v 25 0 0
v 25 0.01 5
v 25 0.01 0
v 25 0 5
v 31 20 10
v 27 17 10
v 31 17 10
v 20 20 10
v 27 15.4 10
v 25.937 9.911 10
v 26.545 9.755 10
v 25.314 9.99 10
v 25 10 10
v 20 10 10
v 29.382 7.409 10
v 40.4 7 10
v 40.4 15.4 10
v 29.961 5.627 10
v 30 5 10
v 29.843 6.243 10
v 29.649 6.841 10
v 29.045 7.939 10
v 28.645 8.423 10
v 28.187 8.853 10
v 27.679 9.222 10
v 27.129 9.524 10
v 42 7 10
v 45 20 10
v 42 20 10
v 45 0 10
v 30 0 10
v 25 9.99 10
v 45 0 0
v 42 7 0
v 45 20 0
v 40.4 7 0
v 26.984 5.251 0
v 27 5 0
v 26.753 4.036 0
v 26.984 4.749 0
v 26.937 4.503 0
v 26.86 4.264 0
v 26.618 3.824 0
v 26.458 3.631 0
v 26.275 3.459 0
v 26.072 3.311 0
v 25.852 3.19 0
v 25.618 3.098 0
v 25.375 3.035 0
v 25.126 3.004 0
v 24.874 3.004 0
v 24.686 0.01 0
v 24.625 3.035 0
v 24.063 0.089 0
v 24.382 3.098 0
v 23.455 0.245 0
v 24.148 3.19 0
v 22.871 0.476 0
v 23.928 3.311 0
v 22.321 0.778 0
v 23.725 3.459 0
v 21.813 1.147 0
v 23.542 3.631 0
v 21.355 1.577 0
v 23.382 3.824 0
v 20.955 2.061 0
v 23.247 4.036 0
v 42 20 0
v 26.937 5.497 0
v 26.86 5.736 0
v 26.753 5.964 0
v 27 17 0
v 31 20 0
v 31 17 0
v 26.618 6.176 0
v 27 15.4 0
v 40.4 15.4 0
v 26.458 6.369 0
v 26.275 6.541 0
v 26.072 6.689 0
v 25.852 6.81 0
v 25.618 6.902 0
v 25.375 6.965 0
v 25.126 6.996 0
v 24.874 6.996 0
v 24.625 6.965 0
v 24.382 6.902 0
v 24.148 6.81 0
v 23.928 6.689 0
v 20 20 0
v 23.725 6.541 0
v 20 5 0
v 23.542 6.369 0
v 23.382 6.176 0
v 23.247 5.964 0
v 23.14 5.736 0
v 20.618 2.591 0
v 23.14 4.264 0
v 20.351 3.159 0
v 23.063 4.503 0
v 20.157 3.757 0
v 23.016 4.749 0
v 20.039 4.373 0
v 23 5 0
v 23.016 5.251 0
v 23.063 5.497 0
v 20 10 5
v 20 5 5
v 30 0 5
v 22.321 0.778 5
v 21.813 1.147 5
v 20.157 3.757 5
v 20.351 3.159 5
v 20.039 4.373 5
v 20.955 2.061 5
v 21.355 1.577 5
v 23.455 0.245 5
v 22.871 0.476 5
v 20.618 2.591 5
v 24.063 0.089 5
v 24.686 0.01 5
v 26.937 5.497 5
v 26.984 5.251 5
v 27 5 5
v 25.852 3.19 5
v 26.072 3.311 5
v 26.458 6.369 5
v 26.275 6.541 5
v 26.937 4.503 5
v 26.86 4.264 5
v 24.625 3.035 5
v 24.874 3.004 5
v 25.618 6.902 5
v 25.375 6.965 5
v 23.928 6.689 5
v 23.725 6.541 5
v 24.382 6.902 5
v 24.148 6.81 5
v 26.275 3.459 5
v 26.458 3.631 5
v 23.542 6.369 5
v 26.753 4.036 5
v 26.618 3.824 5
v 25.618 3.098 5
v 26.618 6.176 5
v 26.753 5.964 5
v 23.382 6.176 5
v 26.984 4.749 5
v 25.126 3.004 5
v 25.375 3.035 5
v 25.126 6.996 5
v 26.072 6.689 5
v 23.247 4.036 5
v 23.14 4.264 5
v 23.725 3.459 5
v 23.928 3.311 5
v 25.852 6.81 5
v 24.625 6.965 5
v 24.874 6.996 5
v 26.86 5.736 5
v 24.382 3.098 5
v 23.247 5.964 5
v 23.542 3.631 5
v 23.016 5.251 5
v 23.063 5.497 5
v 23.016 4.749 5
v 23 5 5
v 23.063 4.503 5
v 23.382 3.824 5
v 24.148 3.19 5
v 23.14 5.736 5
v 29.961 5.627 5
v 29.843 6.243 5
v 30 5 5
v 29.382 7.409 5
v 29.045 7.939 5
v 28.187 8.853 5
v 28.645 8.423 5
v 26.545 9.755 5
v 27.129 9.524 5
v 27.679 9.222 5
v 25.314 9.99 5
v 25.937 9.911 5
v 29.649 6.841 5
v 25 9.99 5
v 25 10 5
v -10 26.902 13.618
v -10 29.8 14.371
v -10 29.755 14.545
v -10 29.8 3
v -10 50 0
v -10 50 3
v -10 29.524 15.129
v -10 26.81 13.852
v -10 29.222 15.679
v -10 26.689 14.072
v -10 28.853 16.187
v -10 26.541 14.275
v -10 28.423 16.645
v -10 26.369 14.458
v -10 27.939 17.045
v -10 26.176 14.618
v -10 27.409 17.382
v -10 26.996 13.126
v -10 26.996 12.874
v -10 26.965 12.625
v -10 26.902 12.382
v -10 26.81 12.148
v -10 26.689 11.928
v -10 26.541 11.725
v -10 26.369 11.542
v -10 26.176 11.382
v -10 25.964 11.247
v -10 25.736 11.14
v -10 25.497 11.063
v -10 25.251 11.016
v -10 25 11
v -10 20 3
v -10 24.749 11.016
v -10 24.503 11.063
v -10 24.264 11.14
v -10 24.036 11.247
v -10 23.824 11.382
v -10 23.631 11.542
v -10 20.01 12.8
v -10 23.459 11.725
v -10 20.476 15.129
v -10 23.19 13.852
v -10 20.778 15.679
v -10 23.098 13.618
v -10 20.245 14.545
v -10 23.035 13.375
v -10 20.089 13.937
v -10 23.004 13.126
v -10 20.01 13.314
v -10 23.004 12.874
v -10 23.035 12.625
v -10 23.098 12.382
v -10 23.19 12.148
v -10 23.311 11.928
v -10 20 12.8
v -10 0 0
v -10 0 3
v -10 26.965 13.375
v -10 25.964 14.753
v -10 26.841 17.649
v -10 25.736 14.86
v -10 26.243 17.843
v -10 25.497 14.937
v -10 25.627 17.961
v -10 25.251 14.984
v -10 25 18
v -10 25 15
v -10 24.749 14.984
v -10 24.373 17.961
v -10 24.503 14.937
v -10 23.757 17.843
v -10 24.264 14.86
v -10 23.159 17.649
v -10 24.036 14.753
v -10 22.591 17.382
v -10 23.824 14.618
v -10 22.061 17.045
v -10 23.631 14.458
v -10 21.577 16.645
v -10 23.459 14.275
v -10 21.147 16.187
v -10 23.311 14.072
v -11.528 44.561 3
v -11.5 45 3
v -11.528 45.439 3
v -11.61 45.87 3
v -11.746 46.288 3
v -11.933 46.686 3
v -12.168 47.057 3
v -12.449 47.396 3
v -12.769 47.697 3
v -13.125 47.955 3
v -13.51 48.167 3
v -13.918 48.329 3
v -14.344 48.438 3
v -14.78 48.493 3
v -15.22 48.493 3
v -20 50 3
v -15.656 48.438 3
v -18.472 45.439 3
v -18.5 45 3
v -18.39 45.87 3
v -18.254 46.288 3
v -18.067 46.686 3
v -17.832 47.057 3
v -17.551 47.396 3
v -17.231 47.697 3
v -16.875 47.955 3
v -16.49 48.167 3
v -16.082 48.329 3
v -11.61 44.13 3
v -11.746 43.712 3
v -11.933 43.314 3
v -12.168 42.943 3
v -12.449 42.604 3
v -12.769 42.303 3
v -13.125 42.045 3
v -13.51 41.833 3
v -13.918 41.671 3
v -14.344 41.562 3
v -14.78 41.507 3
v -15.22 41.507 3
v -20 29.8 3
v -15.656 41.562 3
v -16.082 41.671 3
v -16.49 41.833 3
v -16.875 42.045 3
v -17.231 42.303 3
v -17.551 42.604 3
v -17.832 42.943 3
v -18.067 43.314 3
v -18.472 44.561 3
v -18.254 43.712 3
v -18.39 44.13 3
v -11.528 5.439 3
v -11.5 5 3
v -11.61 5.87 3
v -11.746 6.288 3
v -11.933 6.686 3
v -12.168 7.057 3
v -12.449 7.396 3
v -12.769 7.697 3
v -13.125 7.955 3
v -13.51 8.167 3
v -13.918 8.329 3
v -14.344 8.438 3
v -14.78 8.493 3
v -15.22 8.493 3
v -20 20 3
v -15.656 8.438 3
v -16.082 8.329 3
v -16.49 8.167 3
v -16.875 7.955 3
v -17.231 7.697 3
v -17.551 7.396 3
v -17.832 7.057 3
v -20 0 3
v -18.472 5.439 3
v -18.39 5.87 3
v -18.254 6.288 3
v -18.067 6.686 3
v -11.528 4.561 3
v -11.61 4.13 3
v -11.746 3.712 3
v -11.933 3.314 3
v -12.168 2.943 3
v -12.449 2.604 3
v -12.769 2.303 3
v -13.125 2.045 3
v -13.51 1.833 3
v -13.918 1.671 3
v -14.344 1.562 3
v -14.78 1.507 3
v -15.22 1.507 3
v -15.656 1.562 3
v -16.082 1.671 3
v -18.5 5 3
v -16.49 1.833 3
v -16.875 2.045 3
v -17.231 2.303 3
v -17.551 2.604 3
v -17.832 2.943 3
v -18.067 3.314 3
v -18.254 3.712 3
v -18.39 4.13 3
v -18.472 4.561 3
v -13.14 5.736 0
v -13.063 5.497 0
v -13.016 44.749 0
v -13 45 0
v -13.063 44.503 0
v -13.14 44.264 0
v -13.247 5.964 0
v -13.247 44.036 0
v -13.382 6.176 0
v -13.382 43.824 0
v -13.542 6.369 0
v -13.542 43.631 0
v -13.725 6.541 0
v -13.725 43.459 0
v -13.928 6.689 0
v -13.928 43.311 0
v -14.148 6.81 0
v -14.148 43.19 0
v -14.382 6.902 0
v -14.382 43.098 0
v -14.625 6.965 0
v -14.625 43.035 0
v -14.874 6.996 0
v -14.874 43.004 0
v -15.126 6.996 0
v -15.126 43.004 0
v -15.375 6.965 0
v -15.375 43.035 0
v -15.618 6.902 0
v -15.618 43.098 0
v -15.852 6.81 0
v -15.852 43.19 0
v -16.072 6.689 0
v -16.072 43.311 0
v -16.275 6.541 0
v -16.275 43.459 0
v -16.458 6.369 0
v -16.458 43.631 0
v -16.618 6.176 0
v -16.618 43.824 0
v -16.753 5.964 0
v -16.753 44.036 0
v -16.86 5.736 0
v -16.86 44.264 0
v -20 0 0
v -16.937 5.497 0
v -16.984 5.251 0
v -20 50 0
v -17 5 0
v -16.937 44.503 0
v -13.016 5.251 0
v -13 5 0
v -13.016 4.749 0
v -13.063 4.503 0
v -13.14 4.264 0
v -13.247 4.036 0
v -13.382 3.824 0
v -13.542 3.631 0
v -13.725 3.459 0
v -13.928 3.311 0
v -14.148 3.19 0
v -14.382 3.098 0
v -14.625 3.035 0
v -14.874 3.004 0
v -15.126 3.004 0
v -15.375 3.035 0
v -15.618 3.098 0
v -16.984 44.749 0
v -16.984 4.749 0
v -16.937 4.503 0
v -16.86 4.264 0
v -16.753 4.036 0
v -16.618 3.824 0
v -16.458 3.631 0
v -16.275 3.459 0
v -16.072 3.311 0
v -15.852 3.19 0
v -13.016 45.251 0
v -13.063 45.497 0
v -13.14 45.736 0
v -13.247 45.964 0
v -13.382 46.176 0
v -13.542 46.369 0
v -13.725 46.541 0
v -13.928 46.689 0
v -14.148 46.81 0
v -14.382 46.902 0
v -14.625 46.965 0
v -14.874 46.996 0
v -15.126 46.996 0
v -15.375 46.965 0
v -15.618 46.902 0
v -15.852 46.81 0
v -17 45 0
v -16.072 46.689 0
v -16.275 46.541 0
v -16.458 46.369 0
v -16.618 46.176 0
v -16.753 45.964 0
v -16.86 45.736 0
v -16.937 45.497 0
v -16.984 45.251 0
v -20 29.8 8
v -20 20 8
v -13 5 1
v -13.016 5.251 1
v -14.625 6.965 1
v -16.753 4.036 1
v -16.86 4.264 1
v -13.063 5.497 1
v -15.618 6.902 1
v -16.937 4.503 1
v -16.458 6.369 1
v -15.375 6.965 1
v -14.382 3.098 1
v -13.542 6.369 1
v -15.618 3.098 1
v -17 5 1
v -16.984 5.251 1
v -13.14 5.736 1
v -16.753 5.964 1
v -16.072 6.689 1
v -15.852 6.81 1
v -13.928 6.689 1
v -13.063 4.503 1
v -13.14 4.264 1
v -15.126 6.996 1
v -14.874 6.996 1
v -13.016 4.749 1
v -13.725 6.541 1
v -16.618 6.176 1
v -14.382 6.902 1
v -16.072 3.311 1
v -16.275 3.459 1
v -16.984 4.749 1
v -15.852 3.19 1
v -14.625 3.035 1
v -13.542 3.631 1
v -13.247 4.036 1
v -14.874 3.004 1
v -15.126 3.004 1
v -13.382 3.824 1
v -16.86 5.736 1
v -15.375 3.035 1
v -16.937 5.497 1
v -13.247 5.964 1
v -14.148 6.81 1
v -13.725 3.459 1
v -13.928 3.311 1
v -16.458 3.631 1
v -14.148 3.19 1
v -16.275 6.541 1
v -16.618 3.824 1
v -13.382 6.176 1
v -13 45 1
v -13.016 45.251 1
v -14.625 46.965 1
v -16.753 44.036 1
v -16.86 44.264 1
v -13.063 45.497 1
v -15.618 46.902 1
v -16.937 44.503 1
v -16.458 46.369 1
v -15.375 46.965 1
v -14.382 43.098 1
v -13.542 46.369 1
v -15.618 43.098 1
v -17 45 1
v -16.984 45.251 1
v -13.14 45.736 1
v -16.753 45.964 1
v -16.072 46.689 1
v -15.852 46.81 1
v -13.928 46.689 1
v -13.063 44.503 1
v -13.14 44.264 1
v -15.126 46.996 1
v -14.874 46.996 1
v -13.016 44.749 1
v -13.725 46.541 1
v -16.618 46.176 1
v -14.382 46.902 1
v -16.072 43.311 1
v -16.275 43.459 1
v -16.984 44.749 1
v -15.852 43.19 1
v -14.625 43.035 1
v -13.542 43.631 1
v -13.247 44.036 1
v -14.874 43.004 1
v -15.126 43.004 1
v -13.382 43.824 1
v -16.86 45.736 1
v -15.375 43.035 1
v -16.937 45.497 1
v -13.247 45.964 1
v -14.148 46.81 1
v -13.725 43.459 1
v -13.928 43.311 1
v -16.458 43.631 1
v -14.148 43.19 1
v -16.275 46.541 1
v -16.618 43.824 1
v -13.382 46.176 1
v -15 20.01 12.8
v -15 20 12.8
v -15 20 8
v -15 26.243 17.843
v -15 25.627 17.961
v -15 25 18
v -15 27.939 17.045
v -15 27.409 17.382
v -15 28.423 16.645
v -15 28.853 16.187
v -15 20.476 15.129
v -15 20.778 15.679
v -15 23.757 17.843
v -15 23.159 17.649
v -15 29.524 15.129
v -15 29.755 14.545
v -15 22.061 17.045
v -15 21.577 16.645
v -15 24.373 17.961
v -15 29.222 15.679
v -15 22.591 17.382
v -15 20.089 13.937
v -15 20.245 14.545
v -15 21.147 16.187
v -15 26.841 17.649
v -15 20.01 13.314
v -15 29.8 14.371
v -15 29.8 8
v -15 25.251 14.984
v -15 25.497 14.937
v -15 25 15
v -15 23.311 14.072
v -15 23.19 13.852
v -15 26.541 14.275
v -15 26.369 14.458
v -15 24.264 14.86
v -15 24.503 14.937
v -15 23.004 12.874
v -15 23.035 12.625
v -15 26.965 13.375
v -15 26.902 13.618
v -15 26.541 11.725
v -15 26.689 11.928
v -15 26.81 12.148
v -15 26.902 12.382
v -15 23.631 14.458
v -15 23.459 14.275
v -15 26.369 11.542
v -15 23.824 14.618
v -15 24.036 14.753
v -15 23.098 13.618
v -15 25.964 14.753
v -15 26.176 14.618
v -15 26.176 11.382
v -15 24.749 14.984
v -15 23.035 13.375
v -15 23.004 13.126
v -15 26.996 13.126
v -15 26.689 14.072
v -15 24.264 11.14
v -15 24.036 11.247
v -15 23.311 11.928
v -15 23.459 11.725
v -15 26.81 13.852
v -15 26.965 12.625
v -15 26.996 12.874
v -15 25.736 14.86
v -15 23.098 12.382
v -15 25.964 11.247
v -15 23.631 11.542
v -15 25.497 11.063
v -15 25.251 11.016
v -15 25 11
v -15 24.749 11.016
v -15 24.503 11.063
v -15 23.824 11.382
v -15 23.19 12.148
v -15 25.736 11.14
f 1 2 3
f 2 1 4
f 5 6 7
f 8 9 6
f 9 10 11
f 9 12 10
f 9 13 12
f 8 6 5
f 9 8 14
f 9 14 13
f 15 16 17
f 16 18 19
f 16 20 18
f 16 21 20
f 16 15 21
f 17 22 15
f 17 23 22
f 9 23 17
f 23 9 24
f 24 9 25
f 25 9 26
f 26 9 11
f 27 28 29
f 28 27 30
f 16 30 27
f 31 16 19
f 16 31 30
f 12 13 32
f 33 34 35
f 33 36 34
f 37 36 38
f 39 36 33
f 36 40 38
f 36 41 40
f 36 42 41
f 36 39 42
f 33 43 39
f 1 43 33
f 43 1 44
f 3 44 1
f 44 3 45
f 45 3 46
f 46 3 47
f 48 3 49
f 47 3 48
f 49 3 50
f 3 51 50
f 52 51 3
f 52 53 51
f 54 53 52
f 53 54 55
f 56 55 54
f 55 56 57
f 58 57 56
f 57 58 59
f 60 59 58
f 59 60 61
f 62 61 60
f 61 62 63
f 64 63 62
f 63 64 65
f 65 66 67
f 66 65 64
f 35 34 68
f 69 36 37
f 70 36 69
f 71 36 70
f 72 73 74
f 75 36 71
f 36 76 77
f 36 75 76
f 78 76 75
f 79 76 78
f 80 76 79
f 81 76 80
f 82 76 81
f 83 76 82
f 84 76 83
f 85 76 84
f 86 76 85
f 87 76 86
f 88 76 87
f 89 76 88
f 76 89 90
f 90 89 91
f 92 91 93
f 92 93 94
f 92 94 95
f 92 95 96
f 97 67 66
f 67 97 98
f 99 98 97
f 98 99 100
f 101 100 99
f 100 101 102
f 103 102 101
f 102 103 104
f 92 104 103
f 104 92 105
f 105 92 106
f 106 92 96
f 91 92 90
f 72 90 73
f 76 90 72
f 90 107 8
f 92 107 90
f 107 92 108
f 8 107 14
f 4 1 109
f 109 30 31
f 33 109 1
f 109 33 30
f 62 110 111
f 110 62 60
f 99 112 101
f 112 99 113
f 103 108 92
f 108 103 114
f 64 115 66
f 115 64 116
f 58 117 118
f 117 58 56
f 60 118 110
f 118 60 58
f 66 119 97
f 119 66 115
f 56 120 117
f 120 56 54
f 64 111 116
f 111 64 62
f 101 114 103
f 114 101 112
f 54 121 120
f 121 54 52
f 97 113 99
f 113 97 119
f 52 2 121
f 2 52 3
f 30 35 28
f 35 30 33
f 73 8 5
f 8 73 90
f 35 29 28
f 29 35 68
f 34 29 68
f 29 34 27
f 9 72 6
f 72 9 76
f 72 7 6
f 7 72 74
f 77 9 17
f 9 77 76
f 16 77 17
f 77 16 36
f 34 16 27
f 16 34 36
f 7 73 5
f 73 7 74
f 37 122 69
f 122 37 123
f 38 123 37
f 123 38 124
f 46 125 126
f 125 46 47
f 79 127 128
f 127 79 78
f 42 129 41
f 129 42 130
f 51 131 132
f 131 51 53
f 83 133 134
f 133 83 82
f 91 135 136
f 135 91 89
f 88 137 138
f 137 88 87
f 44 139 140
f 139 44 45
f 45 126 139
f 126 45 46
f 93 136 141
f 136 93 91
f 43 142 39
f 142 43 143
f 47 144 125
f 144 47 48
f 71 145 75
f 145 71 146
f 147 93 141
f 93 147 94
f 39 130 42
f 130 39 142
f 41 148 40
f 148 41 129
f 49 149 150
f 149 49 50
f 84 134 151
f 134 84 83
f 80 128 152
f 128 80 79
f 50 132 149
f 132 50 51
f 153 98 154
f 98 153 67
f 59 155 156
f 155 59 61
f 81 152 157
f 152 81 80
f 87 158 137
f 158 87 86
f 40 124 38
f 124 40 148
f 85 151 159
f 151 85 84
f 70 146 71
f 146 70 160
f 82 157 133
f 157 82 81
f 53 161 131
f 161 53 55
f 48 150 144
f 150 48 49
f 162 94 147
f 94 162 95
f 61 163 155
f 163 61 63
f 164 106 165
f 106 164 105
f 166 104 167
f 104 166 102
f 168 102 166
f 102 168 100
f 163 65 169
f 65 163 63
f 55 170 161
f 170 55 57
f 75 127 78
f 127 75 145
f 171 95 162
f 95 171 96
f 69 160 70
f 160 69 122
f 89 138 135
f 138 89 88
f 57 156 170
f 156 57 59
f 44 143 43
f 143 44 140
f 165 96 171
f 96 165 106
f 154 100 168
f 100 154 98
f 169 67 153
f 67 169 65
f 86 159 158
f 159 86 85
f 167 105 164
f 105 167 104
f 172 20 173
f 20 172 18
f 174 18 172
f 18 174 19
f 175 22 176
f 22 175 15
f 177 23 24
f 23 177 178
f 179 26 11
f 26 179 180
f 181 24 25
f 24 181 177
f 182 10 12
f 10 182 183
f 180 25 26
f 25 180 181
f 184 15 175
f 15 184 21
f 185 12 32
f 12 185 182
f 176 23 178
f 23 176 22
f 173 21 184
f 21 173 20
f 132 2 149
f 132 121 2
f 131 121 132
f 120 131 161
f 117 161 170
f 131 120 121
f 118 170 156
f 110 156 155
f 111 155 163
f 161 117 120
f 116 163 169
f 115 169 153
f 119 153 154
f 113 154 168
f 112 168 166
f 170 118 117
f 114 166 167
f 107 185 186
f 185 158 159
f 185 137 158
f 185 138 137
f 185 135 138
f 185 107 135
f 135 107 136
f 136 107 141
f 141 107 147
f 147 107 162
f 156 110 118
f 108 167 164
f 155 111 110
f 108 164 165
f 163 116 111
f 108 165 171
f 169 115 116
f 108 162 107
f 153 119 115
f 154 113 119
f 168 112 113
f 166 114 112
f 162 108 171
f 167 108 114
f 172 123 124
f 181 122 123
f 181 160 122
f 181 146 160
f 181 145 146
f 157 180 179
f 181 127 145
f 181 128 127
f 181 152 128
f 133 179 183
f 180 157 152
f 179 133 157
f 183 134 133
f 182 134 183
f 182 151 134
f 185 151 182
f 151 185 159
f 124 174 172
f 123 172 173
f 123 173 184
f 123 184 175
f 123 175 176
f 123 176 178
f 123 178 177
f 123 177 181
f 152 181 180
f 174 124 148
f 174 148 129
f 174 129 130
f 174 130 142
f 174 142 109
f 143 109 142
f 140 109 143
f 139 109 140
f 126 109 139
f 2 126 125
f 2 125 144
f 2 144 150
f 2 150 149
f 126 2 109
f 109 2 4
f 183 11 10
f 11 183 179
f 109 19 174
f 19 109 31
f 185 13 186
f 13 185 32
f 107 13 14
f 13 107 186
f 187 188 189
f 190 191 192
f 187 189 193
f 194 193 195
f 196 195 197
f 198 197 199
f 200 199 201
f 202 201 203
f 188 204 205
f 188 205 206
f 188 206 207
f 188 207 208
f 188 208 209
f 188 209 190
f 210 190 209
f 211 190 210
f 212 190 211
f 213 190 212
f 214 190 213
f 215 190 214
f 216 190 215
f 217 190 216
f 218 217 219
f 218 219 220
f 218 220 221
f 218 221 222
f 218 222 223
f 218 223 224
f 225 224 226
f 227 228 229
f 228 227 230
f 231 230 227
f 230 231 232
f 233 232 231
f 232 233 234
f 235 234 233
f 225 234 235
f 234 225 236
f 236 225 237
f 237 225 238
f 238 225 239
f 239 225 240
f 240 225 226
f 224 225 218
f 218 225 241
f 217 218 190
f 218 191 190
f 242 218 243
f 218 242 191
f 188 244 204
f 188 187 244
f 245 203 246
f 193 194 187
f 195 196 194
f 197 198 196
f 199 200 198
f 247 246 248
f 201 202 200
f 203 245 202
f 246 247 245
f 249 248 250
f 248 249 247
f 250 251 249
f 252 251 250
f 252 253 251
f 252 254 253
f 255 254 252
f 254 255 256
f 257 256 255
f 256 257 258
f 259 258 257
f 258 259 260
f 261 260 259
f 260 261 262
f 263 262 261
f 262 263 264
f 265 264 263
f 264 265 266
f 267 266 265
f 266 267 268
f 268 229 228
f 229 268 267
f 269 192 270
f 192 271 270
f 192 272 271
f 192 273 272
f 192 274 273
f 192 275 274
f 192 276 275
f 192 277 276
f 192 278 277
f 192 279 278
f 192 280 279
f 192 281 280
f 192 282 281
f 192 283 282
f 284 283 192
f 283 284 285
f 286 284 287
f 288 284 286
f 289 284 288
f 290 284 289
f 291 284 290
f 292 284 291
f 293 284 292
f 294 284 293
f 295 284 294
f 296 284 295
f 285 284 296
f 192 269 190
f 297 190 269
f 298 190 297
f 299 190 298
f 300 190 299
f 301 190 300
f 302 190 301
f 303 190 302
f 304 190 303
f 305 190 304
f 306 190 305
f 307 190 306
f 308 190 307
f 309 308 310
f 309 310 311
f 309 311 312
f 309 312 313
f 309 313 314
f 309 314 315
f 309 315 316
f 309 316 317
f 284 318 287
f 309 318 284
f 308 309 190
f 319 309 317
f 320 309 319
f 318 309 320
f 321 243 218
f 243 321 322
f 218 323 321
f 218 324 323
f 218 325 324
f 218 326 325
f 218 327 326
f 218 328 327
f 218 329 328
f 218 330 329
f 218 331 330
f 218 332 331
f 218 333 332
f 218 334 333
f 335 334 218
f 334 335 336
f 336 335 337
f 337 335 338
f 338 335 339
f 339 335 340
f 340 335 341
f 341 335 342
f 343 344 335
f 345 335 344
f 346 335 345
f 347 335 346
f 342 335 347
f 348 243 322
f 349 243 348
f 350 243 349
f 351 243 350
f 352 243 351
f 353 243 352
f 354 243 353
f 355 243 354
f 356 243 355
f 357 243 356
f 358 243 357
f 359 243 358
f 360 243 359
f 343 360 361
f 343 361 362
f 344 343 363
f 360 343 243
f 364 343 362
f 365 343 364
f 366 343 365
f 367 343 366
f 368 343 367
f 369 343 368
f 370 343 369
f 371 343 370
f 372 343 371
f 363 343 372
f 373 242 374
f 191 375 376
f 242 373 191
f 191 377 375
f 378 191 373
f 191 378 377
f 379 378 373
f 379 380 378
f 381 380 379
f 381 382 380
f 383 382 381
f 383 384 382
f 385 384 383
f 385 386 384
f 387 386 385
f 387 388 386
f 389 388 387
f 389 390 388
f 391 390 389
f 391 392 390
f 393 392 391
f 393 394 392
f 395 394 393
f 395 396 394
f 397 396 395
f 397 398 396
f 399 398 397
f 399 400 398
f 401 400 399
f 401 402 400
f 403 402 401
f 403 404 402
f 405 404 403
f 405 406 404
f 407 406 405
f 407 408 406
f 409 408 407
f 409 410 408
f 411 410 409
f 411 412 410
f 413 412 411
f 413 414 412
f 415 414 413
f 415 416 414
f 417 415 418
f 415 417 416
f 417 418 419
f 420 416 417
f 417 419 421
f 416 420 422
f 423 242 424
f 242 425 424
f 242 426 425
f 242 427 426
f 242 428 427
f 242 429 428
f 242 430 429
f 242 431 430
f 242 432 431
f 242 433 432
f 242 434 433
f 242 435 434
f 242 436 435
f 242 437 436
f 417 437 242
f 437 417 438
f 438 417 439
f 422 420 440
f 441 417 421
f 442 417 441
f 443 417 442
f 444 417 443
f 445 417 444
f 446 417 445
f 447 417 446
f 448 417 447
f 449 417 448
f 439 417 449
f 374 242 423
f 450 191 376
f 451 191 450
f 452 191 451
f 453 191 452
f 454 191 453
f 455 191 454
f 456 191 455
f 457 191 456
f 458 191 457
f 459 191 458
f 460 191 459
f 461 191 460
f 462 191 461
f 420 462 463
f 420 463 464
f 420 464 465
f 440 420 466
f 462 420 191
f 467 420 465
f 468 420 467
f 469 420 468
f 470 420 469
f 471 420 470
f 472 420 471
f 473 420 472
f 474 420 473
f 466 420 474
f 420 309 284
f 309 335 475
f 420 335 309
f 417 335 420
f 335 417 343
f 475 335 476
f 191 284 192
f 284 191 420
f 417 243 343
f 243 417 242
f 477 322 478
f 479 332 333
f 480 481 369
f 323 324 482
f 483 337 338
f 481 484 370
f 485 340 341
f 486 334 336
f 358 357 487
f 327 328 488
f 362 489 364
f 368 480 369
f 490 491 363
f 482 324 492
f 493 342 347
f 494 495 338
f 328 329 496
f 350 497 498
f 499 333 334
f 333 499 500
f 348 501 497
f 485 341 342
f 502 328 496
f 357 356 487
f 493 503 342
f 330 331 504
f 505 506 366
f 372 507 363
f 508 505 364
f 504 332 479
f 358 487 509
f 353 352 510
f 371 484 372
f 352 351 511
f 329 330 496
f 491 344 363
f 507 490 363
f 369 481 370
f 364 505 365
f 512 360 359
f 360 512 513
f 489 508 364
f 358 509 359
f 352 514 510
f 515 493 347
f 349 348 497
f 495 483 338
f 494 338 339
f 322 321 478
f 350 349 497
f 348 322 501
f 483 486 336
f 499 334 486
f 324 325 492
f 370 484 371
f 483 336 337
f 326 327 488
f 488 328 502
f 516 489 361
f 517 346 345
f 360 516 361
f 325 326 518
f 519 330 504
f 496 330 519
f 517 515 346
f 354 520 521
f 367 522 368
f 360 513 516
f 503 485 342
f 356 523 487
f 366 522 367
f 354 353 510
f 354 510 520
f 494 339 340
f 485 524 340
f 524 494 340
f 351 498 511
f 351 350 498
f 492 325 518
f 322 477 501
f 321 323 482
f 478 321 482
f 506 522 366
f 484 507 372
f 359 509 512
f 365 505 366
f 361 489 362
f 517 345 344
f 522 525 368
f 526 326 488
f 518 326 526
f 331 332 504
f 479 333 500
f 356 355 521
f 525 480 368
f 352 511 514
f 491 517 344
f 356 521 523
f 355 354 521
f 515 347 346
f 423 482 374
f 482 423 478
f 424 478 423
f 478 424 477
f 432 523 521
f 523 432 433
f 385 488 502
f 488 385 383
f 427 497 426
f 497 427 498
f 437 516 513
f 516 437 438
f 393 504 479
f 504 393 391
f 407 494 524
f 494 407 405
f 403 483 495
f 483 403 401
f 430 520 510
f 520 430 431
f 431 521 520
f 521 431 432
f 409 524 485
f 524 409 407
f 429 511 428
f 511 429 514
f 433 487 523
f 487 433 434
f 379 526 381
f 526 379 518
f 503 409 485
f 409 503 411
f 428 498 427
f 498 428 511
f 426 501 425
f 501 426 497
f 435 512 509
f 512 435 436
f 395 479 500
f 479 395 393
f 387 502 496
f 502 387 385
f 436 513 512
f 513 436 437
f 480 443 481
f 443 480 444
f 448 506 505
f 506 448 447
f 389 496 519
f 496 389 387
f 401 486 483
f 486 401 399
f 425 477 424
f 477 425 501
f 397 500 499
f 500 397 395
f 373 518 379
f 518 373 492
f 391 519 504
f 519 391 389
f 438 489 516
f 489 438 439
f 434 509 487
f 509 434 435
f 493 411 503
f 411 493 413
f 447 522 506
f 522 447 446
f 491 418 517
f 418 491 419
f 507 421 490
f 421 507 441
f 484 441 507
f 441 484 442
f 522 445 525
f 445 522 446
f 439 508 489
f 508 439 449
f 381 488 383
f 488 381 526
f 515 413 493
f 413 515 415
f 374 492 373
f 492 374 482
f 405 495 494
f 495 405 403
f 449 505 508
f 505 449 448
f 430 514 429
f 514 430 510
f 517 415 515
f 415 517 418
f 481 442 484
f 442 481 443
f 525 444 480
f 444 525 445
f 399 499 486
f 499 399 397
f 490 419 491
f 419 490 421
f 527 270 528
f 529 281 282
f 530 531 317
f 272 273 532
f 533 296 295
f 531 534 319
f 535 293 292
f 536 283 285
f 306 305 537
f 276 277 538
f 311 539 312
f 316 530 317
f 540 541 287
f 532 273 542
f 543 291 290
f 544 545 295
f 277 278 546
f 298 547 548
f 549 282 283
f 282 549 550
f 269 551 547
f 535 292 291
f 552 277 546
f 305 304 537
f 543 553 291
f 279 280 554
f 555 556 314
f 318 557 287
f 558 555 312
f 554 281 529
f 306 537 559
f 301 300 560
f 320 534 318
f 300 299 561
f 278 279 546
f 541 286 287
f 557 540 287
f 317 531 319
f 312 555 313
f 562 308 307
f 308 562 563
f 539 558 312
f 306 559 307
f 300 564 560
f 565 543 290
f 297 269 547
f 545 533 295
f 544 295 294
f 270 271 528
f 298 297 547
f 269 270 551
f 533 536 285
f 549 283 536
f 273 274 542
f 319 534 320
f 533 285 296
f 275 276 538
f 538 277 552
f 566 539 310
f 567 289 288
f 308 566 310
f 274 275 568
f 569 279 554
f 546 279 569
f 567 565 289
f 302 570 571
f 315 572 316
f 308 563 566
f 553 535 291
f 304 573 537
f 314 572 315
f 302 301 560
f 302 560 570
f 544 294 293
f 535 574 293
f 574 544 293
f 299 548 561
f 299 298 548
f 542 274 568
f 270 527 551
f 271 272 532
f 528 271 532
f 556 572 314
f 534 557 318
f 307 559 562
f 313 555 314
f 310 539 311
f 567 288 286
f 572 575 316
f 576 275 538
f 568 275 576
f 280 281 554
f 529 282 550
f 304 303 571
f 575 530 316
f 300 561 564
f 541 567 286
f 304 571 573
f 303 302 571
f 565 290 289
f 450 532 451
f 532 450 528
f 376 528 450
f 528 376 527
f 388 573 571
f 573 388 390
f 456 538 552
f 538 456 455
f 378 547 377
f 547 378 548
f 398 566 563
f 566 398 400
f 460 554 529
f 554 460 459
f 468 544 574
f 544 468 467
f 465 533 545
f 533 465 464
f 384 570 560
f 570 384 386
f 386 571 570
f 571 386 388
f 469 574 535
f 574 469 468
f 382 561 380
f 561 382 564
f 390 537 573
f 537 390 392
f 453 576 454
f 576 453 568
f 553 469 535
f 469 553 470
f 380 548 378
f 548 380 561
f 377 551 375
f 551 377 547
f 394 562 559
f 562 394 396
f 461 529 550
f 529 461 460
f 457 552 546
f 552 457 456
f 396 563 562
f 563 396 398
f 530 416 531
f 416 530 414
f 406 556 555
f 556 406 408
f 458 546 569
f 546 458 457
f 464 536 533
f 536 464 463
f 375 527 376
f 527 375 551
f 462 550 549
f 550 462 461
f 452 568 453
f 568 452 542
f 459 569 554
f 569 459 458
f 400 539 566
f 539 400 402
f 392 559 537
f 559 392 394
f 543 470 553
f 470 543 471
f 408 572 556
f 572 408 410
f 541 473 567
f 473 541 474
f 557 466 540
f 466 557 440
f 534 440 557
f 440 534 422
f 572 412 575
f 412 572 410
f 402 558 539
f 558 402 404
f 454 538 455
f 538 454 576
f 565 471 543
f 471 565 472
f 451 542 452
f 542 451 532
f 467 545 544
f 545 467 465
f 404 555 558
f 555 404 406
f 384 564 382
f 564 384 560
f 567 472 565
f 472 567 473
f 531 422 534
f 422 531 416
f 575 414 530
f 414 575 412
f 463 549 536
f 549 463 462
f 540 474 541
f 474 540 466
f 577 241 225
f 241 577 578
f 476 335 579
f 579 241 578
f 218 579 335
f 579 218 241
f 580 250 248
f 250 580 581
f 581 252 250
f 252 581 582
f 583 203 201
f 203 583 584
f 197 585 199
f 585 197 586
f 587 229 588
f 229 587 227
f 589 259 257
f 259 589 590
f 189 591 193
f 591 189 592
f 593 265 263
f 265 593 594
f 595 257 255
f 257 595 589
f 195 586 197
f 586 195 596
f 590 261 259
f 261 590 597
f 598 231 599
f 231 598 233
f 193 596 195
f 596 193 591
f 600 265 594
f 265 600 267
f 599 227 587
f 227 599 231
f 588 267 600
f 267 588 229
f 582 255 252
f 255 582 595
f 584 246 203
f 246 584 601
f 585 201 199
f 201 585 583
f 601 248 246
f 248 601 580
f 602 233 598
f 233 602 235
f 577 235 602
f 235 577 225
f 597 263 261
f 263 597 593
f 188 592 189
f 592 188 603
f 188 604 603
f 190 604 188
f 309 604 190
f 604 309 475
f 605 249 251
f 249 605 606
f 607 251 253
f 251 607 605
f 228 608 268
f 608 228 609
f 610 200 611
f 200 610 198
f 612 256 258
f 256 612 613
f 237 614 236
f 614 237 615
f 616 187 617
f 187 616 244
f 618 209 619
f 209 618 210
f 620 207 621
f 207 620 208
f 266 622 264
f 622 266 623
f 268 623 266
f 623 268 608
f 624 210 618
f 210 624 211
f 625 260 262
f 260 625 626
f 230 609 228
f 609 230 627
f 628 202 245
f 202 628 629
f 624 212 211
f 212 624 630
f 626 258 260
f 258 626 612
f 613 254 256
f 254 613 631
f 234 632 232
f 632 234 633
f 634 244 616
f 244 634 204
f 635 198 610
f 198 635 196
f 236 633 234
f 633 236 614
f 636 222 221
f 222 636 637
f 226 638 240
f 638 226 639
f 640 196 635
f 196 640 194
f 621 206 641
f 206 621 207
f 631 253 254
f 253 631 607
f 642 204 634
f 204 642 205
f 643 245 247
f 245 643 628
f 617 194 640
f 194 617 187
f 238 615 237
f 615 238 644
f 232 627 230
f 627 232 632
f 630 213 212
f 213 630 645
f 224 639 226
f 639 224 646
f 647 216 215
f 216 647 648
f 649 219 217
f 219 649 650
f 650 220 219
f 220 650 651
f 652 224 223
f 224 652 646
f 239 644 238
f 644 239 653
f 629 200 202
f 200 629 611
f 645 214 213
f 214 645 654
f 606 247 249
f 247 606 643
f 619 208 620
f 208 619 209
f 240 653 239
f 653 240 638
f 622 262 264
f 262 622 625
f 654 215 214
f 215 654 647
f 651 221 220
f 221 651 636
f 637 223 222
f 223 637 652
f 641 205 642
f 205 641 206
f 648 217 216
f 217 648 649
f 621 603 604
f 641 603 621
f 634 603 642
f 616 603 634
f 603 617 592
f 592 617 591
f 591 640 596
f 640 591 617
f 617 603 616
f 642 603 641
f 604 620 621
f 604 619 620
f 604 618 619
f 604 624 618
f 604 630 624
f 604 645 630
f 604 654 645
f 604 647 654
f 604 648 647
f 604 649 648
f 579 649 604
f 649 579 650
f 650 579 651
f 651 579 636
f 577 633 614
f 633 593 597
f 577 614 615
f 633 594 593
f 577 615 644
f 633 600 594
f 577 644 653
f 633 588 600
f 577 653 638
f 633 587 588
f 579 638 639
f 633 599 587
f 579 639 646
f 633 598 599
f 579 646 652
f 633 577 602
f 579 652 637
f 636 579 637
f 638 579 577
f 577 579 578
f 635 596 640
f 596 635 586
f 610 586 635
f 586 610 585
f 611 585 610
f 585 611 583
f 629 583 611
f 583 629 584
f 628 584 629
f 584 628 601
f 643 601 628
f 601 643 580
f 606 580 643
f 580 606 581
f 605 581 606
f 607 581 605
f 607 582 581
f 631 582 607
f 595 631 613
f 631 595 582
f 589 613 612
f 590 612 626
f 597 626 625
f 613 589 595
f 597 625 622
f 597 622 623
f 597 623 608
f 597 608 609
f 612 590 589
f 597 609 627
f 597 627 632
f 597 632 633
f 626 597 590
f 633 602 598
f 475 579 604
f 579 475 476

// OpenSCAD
base_width=10;
base_height=50;
base_thickness=3;
base_arm_lenght=15;

hole_diameter=4;
hole_border=3;

holder_width=25;
holder_height=20;
holder_thickness=10;

profile_width=15;
profile_height=10;
profile_thickness=1.6;
profile_border=3;

strip_space_width=11;

screw_hole_diameter=7;
screw_hole_depth=2;

spacing=0.2;
$fn=50;

Assembly();

module Assembly(){
    translate ([20,0,0]) holder();
    translate ([-20,0,0])base();
    };

module holder(){
    difference(){
        cube([holder_width,holder_height,holder_thickness],center = false);
        difference(){
            cube([hole_border+hole_diameter/2,hole_border+hole_diameter/2,holder_thickness], center=false);
            translate([hole_diameter/2+hole_border,hole_diameter/2+hole_border,0])cylinder(r=hole_diameter/2+hole_border,h=holder_thickness,center = false);
        }
        translate([holder_width-profile_width-profile_border,holder_height-profile_thickness-profile_border,0,]) cube([profile_width,profile_thickness,holder_thickness],center = false);
        translate([holder_width-profile_thickness-profile_border,holder_height-profile_height-profile_border,0,]) cube([profile_thickness,profile_height,holder_thickness],center = false);
            translate([holder_width-strip_space_width-profile_border,holder_height-profile_border,0,]) cube([strip_space_width,profile_border,holder_thickness],center = false); 
        translate([hole_border+(hole_diameter/2),hole_border+(hole_diameter/2),0,]) cylinder(r=hole_diameter/2,h=holder_thickness,center = false);
        translate([hole_diameter/2+hole_border,hole_diameter/2+hole_border,holder_thickness/2])cylinder(r=hole_diameter/2+hole_border,h=holder_thickness/2,center = false);        
        translate([hole_diameter/2+hole_border,0,holder_thickness/2])cube ([hole_diameter/2+hole_border,hole_diameter/2+hole_border,holder_thickness/2],center = false); 
        translate([0,hole_diameter/2+hole_border,holder_thickness/2])cube ([hole_diameter/2+hole_border,hole_diameter/2+hole_border,holder_thickness/2],center = false); 
        }
               

    };
module base(){
    union(){
/*Base*/    
        difference(){
        cube([base_width,base_height,base_thickness],center = false);
/*Hole1*/
        translate([hole_diameter/2+hole_border,hole_diameter/2+hole_border,base_thickness-screw_hole_depth])cylinder(r2=screw_hole_diameter/2,r1=hole_diameter/2,h=screw_hole_depth,center = false);
        translate([hole_diameter/2+hole_border,hole_diameter/2+hole_border,0])cylinder(r=hole_diameter/2,h=base_width/2,center = false); 
/*Hole1*/
        translate([hole_diameter/2+hole_border,base_height-(hole_diameter/2+hole_border),base_thickness-screw_hole_depth])cylinder(r2=screw_hole_diameter/2,r1=hole_diameter/2,h=screw_hole_depth,center = false);
        translate([hole_diameter/2+hole_border,base_height-(hole_diameter/2+hole_border),0])cylinder(r=hole_diameter/2,h=base_width/2,center = false); 
        }
/*Arm*/            
        translate([base_width,base_height/2-(base_width/2),base_thickness]) rotate([0,-90,0]){ 
          difference(){
                cube([base_arm_lenght,base_width-spacing,hole_diameter+2*hole_border]);
              translate([base_arm_lenght-(2*hole_border+hole_diameter),0,0]) difference(){
            translate([hole_border+hole_diameter/2-spacing,0,0]) cube([hole_border+(hole_diameter/2)+2*spacing,2*hole_border+hole_diameter,base_width], center=false);
            translate([base_arm_lenght-(2*hole_border+hole_diameter),hole_diameter/2+hole_border,0])cylinder(r=hole_diameter/2+hole_border,h=holder_thickness,center = false);
        }
                translate([base_arm_lenght-(hole_border+(hole_diameter/2)),hole_border+(hole_diameter/2),0,]) cylinder(r=hole_diameter/2,h=holder_thickness,center = false);
              translate([base_arm_lenght-(hole_diameter+2*hole_border),0,holder_thickness/2])cube ([hole_diameter+2*hole_border,hole_diameter+2*hole_border,holder_thickness/2],center = false);
        
                };
            
        };
        };
    };
